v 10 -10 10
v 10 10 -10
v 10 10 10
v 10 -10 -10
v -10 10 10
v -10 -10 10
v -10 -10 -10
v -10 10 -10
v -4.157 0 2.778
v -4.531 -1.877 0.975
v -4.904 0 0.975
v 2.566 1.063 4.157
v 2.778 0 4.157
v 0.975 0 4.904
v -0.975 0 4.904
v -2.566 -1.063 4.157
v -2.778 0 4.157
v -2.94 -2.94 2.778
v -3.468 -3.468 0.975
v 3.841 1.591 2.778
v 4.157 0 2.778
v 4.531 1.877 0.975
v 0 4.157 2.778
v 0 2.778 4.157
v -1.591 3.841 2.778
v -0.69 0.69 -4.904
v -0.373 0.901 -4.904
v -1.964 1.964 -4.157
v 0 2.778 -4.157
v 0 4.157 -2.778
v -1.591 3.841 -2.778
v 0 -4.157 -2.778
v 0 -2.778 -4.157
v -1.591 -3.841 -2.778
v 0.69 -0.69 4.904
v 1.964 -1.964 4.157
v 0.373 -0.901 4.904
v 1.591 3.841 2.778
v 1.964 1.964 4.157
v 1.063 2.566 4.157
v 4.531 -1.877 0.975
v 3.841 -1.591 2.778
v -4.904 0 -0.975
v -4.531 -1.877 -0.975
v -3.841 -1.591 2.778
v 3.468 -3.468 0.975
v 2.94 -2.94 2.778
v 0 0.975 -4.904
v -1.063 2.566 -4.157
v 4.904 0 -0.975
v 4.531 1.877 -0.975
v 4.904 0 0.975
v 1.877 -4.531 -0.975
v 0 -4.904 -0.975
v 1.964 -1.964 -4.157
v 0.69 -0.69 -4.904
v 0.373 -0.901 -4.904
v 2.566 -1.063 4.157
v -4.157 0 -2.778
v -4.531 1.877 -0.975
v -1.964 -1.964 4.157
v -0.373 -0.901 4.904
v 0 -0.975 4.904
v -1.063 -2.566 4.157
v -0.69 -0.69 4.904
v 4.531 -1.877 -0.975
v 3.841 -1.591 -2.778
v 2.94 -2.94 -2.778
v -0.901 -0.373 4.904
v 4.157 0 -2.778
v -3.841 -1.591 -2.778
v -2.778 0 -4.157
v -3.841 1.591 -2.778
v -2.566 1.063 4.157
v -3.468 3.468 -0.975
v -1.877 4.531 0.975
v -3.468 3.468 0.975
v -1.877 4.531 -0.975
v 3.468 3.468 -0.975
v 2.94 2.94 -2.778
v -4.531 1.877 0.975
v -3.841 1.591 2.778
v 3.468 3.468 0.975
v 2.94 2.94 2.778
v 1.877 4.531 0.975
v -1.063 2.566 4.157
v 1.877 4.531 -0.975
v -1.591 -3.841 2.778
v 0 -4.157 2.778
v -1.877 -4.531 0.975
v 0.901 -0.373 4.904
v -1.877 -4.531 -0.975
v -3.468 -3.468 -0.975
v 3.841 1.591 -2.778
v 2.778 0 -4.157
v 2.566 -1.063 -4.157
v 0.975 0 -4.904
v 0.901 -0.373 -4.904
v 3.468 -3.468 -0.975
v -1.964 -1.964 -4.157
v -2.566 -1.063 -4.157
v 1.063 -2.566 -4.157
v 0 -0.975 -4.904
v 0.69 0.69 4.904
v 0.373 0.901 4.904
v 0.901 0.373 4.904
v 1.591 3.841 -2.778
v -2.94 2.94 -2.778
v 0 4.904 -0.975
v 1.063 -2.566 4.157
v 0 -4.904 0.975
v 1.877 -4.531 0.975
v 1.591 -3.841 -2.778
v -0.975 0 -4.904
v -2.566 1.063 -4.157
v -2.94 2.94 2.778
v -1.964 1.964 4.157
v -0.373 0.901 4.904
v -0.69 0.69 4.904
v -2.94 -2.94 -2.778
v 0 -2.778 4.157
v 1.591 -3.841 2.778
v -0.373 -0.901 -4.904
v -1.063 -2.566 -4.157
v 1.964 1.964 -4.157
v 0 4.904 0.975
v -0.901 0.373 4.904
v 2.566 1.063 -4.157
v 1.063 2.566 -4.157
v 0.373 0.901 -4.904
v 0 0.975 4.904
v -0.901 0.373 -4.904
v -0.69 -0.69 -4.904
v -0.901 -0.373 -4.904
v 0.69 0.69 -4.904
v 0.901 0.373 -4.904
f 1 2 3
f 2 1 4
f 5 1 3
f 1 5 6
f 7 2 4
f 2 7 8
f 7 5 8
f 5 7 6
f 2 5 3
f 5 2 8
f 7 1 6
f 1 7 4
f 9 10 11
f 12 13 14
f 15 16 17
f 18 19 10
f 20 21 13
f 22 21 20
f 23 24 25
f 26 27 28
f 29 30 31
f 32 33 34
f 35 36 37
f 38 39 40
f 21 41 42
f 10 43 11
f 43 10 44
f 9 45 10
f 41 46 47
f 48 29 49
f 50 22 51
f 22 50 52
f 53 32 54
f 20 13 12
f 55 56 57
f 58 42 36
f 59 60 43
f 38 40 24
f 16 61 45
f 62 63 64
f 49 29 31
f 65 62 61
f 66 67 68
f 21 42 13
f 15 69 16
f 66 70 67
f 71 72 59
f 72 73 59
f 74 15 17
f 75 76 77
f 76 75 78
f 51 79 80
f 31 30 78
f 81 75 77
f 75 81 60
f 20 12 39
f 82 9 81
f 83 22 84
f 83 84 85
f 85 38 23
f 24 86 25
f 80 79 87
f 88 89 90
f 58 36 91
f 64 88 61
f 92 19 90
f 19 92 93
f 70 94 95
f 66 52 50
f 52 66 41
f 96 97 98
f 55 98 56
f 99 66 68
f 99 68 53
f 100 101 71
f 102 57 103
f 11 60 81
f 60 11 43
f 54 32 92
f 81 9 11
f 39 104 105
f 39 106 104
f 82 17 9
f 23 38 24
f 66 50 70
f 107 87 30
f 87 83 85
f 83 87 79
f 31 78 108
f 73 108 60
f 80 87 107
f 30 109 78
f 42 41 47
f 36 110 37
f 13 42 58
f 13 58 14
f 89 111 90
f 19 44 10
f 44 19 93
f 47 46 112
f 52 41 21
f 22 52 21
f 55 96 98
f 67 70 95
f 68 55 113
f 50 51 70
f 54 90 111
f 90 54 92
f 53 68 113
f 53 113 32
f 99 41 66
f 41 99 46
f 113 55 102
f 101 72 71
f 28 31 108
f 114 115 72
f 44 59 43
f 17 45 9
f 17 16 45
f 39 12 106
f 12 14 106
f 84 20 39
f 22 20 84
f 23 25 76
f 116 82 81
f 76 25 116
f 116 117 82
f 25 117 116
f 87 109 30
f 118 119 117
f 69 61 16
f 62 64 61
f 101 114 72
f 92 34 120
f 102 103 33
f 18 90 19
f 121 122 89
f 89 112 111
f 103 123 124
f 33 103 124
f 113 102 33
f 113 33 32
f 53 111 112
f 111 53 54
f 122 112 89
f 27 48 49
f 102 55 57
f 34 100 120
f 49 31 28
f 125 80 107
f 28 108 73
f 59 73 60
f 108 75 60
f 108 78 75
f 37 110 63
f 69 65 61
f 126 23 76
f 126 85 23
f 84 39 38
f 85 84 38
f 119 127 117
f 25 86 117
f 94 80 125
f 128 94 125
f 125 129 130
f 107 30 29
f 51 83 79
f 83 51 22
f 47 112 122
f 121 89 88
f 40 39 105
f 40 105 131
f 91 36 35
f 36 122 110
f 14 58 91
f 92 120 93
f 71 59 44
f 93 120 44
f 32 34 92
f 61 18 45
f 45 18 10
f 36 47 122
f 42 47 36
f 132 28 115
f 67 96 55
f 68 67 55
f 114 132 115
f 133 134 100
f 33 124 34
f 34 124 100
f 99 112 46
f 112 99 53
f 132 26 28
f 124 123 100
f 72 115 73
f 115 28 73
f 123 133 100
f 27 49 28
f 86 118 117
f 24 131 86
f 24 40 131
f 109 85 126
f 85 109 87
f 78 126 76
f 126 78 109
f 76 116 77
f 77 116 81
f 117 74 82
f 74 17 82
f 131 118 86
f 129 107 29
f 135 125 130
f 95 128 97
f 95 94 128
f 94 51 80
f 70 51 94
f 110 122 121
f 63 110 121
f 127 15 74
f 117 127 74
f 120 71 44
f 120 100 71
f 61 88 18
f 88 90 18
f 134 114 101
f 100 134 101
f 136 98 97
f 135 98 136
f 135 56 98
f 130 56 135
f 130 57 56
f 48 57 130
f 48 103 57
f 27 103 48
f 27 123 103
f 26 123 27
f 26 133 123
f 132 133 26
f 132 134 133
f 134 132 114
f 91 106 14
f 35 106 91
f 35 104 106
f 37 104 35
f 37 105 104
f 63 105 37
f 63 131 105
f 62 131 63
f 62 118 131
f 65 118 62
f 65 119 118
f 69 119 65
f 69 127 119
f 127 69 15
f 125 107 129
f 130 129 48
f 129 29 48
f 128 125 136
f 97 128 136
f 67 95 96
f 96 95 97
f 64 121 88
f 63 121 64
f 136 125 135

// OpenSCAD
// The exact-geometry audit's case x09 (docs/audits/exact-geometry-rust.md).
// volume: 7476.401224401701
difference() { cube(20, center=true); sphere(5); }
